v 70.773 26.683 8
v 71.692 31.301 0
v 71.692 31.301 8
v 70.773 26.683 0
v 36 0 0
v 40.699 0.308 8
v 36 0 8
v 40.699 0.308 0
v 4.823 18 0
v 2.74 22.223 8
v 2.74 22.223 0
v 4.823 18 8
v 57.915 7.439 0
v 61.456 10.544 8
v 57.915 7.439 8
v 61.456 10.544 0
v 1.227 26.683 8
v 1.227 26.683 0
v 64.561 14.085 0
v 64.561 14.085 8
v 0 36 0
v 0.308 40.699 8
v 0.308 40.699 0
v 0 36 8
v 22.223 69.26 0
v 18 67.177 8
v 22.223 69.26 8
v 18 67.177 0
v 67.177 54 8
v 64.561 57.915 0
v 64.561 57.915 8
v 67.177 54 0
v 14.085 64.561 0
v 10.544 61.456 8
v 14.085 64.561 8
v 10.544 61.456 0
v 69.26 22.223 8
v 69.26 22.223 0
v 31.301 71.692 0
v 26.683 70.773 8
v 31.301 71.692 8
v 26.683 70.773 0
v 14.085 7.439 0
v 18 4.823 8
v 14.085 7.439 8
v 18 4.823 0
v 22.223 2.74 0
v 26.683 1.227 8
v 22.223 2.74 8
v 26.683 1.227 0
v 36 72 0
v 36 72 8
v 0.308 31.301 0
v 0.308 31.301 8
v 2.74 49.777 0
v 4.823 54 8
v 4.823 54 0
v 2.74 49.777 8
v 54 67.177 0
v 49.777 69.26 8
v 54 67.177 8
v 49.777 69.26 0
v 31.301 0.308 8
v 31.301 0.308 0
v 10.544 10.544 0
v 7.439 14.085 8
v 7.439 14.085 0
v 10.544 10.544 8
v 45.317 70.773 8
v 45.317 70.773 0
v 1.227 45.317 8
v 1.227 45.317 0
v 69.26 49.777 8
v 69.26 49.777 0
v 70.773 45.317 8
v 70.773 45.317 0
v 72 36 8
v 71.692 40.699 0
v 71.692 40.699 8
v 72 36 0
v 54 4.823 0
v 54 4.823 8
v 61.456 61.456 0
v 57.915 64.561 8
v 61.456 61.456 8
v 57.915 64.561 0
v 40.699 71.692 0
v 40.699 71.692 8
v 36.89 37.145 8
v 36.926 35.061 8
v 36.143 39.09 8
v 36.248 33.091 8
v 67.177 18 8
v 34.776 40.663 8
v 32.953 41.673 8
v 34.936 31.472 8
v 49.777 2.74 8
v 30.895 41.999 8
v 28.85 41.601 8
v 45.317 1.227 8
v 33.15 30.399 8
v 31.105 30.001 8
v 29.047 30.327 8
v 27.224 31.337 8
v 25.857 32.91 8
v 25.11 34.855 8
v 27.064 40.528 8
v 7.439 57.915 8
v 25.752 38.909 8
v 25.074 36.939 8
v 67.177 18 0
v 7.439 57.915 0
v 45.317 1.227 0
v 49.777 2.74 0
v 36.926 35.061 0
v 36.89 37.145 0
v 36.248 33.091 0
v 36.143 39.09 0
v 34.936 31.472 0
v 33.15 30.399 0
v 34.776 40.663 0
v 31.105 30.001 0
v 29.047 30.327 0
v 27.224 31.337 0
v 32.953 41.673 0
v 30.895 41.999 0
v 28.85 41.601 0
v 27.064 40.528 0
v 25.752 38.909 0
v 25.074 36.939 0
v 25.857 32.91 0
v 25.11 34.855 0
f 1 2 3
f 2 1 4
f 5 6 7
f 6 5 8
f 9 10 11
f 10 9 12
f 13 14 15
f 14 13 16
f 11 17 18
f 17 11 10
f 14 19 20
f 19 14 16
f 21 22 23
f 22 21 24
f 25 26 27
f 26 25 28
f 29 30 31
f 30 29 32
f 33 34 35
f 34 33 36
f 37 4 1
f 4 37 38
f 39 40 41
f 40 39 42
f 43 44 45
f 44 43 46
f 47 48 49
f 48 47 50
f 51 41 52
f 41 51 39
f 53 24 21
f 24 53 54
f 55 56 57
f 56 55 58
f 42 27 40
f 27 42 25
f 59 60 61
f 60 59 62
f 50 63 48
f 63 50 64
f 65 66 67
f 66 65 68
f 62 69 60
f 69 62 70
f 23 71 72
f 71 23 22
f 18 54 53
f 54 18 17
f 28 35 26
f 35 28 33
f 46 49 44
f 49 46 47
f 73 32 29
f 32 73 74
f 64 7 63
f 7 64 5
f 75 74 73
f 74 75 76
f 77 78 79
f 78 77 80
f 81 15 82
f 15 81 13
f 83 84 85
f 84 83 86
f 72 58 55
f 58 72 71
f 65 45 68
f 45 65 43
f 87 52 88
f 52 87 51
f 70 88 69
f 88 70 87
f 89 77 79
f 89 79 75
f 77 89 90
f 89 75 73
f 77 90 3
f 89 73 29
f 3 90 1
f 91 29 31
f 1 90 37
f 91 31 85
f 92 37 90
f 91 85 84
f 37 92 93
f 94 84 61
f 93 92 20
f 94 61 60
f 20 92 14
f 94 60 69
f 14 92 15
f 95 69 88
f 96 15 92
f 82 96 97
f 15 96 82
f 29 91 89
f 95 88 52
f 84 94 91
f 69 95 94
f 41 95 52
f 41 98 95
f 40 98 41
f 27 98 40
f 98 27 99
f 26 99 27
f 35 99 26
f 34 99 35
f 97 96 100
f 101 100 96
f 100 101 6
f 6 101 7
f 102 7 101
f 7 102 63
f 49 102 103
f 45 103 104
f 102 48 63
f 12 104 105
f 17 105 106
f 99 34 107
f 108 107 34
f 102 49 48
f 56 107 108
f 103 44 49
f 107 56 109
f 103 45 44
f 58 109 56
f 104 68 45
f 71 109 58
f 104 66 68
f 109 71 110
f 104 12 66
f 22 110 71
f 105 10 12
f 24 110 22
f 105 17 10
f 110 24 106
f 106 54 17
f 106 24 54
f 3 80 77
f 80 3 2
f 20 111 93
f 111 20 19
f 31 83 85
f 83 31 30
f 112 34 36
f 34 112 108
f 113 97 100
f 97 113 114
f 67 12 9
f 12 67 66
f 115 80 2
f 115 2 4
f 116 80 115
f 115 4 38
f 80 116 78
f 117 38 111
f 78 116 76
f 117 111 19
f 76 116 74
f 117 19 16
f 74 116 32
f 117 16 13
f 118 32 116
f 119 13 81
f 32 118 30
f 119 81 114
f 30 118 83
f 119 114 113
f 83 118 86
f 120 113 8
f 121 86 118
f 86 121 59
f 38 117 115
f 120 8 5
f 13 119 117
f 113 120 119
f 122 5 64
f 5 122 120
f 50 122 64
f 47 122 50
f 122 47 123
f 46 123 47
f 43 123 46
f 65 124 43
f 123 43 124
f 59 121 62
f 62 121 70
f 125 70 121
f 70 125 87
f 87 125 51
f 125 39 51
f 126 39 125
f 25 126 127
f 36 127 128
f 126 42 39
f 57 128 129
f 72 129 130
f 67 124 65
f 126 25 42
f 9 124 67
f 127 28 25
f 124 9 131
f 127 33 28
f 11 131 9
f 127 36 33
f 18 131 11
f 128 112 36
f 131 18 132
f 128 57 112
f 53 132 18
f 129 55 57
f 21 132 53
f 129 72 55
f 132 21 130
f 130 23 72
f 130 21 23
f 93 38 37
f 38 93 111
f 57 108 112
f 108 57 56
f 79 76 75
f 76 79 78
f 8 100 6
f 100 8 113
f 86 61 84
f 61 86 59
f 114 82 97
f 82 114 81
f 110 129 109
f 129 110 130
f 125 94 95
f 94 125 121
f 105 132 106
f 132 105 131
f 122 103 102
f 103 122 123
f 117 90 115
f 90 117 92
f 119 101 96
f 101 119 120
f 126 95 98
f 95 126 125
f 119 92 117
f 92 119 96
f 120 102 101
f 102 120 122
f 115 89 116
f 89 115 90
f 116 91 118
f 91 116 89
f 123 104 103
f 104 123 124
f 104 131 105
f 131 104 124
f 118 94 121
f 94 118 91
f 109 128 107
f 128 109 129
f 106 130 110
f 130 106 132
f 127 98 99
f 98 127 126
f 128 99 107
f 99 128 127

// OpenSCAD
$fn = 32;

// ----------------------------------------------------------------------
// Cam plate: eccentric cam, base R36
// ----------------------------------------------------------------------

// --- parameters (mm) ---
base_r = 36;              // base circle radius
lobe_h = 14;              // cam lobe rise
bore_r = 6;               // shaft bore radius
plate_t = 8;              // plate thickness, Z (extrusion height)
ecc = 5;                  // disc eccentricity

profile = [[72, 36], [71.692, 40.699], [70.773, 45.317], [69.26, 49.777], [67.177, 54], [64.561, 57.915], [61.456, 61.456], [57.915, 64.561], [54, 67.177], [49.777, 69.26], [45.317, 70.773], [40.699, 71.692], [36, 72], [31.301, 71.692], [26.683, 70.773], [22.223, 69.26], [18, 67.177], [14.085, 64.561], [10.544, 61.456], [7.439, 57.915], [4.823, 54], [2.74, 49.777], [1.227, 45.317], [0.308, 40.699], [0, 36], [0.308, 31.301], [1.227, 26.683], [2.74, 22.223], [4.823, 18], [7.439, 14.085], [10.544, 10.544], [14.085, 7.439], [18, 4.823], [22.223, 2.74], [26.683, 1.227], [31.301, 0.308], [36, 0], [40.699, 0.308], [45.317, 1.227], [49.777, 2.74], [54, 4.823], [57.915, 7.439], [61.456, 10.544], [64.561, 14.085], [67.177, 18], [69.26, 22.223], [70.773, 26.683], [71.692, 31.301]];  // primary outline, 48 points, counter clockwise
void_1 = [[36.89, 37.145], [36.143, 39.09], [34.776, 40.663], [32.953, 41.673], [30.895, 41.999], [28.85, 41.601], [27.064, 40.528], [25.752, 38.909], [25.074, 36.939], [25.11, 34.855], [25.857, 32.91], [27.224, 31.337], [29.047, 30.327], [31.105, 30.001], [33.15, 30.399], [34.936, 31.472], [36.248, 33.091], [36.926, 35.061]];  // shaft bore, 18 points

// --- the one profile operation ---
difference() {
  linear_extrude(height = plate_t) polygon(points = profile);
  translate([0, 0, -1])
    linear_extrude(height = plate_t + 2) polygon(points = void_1);
}
